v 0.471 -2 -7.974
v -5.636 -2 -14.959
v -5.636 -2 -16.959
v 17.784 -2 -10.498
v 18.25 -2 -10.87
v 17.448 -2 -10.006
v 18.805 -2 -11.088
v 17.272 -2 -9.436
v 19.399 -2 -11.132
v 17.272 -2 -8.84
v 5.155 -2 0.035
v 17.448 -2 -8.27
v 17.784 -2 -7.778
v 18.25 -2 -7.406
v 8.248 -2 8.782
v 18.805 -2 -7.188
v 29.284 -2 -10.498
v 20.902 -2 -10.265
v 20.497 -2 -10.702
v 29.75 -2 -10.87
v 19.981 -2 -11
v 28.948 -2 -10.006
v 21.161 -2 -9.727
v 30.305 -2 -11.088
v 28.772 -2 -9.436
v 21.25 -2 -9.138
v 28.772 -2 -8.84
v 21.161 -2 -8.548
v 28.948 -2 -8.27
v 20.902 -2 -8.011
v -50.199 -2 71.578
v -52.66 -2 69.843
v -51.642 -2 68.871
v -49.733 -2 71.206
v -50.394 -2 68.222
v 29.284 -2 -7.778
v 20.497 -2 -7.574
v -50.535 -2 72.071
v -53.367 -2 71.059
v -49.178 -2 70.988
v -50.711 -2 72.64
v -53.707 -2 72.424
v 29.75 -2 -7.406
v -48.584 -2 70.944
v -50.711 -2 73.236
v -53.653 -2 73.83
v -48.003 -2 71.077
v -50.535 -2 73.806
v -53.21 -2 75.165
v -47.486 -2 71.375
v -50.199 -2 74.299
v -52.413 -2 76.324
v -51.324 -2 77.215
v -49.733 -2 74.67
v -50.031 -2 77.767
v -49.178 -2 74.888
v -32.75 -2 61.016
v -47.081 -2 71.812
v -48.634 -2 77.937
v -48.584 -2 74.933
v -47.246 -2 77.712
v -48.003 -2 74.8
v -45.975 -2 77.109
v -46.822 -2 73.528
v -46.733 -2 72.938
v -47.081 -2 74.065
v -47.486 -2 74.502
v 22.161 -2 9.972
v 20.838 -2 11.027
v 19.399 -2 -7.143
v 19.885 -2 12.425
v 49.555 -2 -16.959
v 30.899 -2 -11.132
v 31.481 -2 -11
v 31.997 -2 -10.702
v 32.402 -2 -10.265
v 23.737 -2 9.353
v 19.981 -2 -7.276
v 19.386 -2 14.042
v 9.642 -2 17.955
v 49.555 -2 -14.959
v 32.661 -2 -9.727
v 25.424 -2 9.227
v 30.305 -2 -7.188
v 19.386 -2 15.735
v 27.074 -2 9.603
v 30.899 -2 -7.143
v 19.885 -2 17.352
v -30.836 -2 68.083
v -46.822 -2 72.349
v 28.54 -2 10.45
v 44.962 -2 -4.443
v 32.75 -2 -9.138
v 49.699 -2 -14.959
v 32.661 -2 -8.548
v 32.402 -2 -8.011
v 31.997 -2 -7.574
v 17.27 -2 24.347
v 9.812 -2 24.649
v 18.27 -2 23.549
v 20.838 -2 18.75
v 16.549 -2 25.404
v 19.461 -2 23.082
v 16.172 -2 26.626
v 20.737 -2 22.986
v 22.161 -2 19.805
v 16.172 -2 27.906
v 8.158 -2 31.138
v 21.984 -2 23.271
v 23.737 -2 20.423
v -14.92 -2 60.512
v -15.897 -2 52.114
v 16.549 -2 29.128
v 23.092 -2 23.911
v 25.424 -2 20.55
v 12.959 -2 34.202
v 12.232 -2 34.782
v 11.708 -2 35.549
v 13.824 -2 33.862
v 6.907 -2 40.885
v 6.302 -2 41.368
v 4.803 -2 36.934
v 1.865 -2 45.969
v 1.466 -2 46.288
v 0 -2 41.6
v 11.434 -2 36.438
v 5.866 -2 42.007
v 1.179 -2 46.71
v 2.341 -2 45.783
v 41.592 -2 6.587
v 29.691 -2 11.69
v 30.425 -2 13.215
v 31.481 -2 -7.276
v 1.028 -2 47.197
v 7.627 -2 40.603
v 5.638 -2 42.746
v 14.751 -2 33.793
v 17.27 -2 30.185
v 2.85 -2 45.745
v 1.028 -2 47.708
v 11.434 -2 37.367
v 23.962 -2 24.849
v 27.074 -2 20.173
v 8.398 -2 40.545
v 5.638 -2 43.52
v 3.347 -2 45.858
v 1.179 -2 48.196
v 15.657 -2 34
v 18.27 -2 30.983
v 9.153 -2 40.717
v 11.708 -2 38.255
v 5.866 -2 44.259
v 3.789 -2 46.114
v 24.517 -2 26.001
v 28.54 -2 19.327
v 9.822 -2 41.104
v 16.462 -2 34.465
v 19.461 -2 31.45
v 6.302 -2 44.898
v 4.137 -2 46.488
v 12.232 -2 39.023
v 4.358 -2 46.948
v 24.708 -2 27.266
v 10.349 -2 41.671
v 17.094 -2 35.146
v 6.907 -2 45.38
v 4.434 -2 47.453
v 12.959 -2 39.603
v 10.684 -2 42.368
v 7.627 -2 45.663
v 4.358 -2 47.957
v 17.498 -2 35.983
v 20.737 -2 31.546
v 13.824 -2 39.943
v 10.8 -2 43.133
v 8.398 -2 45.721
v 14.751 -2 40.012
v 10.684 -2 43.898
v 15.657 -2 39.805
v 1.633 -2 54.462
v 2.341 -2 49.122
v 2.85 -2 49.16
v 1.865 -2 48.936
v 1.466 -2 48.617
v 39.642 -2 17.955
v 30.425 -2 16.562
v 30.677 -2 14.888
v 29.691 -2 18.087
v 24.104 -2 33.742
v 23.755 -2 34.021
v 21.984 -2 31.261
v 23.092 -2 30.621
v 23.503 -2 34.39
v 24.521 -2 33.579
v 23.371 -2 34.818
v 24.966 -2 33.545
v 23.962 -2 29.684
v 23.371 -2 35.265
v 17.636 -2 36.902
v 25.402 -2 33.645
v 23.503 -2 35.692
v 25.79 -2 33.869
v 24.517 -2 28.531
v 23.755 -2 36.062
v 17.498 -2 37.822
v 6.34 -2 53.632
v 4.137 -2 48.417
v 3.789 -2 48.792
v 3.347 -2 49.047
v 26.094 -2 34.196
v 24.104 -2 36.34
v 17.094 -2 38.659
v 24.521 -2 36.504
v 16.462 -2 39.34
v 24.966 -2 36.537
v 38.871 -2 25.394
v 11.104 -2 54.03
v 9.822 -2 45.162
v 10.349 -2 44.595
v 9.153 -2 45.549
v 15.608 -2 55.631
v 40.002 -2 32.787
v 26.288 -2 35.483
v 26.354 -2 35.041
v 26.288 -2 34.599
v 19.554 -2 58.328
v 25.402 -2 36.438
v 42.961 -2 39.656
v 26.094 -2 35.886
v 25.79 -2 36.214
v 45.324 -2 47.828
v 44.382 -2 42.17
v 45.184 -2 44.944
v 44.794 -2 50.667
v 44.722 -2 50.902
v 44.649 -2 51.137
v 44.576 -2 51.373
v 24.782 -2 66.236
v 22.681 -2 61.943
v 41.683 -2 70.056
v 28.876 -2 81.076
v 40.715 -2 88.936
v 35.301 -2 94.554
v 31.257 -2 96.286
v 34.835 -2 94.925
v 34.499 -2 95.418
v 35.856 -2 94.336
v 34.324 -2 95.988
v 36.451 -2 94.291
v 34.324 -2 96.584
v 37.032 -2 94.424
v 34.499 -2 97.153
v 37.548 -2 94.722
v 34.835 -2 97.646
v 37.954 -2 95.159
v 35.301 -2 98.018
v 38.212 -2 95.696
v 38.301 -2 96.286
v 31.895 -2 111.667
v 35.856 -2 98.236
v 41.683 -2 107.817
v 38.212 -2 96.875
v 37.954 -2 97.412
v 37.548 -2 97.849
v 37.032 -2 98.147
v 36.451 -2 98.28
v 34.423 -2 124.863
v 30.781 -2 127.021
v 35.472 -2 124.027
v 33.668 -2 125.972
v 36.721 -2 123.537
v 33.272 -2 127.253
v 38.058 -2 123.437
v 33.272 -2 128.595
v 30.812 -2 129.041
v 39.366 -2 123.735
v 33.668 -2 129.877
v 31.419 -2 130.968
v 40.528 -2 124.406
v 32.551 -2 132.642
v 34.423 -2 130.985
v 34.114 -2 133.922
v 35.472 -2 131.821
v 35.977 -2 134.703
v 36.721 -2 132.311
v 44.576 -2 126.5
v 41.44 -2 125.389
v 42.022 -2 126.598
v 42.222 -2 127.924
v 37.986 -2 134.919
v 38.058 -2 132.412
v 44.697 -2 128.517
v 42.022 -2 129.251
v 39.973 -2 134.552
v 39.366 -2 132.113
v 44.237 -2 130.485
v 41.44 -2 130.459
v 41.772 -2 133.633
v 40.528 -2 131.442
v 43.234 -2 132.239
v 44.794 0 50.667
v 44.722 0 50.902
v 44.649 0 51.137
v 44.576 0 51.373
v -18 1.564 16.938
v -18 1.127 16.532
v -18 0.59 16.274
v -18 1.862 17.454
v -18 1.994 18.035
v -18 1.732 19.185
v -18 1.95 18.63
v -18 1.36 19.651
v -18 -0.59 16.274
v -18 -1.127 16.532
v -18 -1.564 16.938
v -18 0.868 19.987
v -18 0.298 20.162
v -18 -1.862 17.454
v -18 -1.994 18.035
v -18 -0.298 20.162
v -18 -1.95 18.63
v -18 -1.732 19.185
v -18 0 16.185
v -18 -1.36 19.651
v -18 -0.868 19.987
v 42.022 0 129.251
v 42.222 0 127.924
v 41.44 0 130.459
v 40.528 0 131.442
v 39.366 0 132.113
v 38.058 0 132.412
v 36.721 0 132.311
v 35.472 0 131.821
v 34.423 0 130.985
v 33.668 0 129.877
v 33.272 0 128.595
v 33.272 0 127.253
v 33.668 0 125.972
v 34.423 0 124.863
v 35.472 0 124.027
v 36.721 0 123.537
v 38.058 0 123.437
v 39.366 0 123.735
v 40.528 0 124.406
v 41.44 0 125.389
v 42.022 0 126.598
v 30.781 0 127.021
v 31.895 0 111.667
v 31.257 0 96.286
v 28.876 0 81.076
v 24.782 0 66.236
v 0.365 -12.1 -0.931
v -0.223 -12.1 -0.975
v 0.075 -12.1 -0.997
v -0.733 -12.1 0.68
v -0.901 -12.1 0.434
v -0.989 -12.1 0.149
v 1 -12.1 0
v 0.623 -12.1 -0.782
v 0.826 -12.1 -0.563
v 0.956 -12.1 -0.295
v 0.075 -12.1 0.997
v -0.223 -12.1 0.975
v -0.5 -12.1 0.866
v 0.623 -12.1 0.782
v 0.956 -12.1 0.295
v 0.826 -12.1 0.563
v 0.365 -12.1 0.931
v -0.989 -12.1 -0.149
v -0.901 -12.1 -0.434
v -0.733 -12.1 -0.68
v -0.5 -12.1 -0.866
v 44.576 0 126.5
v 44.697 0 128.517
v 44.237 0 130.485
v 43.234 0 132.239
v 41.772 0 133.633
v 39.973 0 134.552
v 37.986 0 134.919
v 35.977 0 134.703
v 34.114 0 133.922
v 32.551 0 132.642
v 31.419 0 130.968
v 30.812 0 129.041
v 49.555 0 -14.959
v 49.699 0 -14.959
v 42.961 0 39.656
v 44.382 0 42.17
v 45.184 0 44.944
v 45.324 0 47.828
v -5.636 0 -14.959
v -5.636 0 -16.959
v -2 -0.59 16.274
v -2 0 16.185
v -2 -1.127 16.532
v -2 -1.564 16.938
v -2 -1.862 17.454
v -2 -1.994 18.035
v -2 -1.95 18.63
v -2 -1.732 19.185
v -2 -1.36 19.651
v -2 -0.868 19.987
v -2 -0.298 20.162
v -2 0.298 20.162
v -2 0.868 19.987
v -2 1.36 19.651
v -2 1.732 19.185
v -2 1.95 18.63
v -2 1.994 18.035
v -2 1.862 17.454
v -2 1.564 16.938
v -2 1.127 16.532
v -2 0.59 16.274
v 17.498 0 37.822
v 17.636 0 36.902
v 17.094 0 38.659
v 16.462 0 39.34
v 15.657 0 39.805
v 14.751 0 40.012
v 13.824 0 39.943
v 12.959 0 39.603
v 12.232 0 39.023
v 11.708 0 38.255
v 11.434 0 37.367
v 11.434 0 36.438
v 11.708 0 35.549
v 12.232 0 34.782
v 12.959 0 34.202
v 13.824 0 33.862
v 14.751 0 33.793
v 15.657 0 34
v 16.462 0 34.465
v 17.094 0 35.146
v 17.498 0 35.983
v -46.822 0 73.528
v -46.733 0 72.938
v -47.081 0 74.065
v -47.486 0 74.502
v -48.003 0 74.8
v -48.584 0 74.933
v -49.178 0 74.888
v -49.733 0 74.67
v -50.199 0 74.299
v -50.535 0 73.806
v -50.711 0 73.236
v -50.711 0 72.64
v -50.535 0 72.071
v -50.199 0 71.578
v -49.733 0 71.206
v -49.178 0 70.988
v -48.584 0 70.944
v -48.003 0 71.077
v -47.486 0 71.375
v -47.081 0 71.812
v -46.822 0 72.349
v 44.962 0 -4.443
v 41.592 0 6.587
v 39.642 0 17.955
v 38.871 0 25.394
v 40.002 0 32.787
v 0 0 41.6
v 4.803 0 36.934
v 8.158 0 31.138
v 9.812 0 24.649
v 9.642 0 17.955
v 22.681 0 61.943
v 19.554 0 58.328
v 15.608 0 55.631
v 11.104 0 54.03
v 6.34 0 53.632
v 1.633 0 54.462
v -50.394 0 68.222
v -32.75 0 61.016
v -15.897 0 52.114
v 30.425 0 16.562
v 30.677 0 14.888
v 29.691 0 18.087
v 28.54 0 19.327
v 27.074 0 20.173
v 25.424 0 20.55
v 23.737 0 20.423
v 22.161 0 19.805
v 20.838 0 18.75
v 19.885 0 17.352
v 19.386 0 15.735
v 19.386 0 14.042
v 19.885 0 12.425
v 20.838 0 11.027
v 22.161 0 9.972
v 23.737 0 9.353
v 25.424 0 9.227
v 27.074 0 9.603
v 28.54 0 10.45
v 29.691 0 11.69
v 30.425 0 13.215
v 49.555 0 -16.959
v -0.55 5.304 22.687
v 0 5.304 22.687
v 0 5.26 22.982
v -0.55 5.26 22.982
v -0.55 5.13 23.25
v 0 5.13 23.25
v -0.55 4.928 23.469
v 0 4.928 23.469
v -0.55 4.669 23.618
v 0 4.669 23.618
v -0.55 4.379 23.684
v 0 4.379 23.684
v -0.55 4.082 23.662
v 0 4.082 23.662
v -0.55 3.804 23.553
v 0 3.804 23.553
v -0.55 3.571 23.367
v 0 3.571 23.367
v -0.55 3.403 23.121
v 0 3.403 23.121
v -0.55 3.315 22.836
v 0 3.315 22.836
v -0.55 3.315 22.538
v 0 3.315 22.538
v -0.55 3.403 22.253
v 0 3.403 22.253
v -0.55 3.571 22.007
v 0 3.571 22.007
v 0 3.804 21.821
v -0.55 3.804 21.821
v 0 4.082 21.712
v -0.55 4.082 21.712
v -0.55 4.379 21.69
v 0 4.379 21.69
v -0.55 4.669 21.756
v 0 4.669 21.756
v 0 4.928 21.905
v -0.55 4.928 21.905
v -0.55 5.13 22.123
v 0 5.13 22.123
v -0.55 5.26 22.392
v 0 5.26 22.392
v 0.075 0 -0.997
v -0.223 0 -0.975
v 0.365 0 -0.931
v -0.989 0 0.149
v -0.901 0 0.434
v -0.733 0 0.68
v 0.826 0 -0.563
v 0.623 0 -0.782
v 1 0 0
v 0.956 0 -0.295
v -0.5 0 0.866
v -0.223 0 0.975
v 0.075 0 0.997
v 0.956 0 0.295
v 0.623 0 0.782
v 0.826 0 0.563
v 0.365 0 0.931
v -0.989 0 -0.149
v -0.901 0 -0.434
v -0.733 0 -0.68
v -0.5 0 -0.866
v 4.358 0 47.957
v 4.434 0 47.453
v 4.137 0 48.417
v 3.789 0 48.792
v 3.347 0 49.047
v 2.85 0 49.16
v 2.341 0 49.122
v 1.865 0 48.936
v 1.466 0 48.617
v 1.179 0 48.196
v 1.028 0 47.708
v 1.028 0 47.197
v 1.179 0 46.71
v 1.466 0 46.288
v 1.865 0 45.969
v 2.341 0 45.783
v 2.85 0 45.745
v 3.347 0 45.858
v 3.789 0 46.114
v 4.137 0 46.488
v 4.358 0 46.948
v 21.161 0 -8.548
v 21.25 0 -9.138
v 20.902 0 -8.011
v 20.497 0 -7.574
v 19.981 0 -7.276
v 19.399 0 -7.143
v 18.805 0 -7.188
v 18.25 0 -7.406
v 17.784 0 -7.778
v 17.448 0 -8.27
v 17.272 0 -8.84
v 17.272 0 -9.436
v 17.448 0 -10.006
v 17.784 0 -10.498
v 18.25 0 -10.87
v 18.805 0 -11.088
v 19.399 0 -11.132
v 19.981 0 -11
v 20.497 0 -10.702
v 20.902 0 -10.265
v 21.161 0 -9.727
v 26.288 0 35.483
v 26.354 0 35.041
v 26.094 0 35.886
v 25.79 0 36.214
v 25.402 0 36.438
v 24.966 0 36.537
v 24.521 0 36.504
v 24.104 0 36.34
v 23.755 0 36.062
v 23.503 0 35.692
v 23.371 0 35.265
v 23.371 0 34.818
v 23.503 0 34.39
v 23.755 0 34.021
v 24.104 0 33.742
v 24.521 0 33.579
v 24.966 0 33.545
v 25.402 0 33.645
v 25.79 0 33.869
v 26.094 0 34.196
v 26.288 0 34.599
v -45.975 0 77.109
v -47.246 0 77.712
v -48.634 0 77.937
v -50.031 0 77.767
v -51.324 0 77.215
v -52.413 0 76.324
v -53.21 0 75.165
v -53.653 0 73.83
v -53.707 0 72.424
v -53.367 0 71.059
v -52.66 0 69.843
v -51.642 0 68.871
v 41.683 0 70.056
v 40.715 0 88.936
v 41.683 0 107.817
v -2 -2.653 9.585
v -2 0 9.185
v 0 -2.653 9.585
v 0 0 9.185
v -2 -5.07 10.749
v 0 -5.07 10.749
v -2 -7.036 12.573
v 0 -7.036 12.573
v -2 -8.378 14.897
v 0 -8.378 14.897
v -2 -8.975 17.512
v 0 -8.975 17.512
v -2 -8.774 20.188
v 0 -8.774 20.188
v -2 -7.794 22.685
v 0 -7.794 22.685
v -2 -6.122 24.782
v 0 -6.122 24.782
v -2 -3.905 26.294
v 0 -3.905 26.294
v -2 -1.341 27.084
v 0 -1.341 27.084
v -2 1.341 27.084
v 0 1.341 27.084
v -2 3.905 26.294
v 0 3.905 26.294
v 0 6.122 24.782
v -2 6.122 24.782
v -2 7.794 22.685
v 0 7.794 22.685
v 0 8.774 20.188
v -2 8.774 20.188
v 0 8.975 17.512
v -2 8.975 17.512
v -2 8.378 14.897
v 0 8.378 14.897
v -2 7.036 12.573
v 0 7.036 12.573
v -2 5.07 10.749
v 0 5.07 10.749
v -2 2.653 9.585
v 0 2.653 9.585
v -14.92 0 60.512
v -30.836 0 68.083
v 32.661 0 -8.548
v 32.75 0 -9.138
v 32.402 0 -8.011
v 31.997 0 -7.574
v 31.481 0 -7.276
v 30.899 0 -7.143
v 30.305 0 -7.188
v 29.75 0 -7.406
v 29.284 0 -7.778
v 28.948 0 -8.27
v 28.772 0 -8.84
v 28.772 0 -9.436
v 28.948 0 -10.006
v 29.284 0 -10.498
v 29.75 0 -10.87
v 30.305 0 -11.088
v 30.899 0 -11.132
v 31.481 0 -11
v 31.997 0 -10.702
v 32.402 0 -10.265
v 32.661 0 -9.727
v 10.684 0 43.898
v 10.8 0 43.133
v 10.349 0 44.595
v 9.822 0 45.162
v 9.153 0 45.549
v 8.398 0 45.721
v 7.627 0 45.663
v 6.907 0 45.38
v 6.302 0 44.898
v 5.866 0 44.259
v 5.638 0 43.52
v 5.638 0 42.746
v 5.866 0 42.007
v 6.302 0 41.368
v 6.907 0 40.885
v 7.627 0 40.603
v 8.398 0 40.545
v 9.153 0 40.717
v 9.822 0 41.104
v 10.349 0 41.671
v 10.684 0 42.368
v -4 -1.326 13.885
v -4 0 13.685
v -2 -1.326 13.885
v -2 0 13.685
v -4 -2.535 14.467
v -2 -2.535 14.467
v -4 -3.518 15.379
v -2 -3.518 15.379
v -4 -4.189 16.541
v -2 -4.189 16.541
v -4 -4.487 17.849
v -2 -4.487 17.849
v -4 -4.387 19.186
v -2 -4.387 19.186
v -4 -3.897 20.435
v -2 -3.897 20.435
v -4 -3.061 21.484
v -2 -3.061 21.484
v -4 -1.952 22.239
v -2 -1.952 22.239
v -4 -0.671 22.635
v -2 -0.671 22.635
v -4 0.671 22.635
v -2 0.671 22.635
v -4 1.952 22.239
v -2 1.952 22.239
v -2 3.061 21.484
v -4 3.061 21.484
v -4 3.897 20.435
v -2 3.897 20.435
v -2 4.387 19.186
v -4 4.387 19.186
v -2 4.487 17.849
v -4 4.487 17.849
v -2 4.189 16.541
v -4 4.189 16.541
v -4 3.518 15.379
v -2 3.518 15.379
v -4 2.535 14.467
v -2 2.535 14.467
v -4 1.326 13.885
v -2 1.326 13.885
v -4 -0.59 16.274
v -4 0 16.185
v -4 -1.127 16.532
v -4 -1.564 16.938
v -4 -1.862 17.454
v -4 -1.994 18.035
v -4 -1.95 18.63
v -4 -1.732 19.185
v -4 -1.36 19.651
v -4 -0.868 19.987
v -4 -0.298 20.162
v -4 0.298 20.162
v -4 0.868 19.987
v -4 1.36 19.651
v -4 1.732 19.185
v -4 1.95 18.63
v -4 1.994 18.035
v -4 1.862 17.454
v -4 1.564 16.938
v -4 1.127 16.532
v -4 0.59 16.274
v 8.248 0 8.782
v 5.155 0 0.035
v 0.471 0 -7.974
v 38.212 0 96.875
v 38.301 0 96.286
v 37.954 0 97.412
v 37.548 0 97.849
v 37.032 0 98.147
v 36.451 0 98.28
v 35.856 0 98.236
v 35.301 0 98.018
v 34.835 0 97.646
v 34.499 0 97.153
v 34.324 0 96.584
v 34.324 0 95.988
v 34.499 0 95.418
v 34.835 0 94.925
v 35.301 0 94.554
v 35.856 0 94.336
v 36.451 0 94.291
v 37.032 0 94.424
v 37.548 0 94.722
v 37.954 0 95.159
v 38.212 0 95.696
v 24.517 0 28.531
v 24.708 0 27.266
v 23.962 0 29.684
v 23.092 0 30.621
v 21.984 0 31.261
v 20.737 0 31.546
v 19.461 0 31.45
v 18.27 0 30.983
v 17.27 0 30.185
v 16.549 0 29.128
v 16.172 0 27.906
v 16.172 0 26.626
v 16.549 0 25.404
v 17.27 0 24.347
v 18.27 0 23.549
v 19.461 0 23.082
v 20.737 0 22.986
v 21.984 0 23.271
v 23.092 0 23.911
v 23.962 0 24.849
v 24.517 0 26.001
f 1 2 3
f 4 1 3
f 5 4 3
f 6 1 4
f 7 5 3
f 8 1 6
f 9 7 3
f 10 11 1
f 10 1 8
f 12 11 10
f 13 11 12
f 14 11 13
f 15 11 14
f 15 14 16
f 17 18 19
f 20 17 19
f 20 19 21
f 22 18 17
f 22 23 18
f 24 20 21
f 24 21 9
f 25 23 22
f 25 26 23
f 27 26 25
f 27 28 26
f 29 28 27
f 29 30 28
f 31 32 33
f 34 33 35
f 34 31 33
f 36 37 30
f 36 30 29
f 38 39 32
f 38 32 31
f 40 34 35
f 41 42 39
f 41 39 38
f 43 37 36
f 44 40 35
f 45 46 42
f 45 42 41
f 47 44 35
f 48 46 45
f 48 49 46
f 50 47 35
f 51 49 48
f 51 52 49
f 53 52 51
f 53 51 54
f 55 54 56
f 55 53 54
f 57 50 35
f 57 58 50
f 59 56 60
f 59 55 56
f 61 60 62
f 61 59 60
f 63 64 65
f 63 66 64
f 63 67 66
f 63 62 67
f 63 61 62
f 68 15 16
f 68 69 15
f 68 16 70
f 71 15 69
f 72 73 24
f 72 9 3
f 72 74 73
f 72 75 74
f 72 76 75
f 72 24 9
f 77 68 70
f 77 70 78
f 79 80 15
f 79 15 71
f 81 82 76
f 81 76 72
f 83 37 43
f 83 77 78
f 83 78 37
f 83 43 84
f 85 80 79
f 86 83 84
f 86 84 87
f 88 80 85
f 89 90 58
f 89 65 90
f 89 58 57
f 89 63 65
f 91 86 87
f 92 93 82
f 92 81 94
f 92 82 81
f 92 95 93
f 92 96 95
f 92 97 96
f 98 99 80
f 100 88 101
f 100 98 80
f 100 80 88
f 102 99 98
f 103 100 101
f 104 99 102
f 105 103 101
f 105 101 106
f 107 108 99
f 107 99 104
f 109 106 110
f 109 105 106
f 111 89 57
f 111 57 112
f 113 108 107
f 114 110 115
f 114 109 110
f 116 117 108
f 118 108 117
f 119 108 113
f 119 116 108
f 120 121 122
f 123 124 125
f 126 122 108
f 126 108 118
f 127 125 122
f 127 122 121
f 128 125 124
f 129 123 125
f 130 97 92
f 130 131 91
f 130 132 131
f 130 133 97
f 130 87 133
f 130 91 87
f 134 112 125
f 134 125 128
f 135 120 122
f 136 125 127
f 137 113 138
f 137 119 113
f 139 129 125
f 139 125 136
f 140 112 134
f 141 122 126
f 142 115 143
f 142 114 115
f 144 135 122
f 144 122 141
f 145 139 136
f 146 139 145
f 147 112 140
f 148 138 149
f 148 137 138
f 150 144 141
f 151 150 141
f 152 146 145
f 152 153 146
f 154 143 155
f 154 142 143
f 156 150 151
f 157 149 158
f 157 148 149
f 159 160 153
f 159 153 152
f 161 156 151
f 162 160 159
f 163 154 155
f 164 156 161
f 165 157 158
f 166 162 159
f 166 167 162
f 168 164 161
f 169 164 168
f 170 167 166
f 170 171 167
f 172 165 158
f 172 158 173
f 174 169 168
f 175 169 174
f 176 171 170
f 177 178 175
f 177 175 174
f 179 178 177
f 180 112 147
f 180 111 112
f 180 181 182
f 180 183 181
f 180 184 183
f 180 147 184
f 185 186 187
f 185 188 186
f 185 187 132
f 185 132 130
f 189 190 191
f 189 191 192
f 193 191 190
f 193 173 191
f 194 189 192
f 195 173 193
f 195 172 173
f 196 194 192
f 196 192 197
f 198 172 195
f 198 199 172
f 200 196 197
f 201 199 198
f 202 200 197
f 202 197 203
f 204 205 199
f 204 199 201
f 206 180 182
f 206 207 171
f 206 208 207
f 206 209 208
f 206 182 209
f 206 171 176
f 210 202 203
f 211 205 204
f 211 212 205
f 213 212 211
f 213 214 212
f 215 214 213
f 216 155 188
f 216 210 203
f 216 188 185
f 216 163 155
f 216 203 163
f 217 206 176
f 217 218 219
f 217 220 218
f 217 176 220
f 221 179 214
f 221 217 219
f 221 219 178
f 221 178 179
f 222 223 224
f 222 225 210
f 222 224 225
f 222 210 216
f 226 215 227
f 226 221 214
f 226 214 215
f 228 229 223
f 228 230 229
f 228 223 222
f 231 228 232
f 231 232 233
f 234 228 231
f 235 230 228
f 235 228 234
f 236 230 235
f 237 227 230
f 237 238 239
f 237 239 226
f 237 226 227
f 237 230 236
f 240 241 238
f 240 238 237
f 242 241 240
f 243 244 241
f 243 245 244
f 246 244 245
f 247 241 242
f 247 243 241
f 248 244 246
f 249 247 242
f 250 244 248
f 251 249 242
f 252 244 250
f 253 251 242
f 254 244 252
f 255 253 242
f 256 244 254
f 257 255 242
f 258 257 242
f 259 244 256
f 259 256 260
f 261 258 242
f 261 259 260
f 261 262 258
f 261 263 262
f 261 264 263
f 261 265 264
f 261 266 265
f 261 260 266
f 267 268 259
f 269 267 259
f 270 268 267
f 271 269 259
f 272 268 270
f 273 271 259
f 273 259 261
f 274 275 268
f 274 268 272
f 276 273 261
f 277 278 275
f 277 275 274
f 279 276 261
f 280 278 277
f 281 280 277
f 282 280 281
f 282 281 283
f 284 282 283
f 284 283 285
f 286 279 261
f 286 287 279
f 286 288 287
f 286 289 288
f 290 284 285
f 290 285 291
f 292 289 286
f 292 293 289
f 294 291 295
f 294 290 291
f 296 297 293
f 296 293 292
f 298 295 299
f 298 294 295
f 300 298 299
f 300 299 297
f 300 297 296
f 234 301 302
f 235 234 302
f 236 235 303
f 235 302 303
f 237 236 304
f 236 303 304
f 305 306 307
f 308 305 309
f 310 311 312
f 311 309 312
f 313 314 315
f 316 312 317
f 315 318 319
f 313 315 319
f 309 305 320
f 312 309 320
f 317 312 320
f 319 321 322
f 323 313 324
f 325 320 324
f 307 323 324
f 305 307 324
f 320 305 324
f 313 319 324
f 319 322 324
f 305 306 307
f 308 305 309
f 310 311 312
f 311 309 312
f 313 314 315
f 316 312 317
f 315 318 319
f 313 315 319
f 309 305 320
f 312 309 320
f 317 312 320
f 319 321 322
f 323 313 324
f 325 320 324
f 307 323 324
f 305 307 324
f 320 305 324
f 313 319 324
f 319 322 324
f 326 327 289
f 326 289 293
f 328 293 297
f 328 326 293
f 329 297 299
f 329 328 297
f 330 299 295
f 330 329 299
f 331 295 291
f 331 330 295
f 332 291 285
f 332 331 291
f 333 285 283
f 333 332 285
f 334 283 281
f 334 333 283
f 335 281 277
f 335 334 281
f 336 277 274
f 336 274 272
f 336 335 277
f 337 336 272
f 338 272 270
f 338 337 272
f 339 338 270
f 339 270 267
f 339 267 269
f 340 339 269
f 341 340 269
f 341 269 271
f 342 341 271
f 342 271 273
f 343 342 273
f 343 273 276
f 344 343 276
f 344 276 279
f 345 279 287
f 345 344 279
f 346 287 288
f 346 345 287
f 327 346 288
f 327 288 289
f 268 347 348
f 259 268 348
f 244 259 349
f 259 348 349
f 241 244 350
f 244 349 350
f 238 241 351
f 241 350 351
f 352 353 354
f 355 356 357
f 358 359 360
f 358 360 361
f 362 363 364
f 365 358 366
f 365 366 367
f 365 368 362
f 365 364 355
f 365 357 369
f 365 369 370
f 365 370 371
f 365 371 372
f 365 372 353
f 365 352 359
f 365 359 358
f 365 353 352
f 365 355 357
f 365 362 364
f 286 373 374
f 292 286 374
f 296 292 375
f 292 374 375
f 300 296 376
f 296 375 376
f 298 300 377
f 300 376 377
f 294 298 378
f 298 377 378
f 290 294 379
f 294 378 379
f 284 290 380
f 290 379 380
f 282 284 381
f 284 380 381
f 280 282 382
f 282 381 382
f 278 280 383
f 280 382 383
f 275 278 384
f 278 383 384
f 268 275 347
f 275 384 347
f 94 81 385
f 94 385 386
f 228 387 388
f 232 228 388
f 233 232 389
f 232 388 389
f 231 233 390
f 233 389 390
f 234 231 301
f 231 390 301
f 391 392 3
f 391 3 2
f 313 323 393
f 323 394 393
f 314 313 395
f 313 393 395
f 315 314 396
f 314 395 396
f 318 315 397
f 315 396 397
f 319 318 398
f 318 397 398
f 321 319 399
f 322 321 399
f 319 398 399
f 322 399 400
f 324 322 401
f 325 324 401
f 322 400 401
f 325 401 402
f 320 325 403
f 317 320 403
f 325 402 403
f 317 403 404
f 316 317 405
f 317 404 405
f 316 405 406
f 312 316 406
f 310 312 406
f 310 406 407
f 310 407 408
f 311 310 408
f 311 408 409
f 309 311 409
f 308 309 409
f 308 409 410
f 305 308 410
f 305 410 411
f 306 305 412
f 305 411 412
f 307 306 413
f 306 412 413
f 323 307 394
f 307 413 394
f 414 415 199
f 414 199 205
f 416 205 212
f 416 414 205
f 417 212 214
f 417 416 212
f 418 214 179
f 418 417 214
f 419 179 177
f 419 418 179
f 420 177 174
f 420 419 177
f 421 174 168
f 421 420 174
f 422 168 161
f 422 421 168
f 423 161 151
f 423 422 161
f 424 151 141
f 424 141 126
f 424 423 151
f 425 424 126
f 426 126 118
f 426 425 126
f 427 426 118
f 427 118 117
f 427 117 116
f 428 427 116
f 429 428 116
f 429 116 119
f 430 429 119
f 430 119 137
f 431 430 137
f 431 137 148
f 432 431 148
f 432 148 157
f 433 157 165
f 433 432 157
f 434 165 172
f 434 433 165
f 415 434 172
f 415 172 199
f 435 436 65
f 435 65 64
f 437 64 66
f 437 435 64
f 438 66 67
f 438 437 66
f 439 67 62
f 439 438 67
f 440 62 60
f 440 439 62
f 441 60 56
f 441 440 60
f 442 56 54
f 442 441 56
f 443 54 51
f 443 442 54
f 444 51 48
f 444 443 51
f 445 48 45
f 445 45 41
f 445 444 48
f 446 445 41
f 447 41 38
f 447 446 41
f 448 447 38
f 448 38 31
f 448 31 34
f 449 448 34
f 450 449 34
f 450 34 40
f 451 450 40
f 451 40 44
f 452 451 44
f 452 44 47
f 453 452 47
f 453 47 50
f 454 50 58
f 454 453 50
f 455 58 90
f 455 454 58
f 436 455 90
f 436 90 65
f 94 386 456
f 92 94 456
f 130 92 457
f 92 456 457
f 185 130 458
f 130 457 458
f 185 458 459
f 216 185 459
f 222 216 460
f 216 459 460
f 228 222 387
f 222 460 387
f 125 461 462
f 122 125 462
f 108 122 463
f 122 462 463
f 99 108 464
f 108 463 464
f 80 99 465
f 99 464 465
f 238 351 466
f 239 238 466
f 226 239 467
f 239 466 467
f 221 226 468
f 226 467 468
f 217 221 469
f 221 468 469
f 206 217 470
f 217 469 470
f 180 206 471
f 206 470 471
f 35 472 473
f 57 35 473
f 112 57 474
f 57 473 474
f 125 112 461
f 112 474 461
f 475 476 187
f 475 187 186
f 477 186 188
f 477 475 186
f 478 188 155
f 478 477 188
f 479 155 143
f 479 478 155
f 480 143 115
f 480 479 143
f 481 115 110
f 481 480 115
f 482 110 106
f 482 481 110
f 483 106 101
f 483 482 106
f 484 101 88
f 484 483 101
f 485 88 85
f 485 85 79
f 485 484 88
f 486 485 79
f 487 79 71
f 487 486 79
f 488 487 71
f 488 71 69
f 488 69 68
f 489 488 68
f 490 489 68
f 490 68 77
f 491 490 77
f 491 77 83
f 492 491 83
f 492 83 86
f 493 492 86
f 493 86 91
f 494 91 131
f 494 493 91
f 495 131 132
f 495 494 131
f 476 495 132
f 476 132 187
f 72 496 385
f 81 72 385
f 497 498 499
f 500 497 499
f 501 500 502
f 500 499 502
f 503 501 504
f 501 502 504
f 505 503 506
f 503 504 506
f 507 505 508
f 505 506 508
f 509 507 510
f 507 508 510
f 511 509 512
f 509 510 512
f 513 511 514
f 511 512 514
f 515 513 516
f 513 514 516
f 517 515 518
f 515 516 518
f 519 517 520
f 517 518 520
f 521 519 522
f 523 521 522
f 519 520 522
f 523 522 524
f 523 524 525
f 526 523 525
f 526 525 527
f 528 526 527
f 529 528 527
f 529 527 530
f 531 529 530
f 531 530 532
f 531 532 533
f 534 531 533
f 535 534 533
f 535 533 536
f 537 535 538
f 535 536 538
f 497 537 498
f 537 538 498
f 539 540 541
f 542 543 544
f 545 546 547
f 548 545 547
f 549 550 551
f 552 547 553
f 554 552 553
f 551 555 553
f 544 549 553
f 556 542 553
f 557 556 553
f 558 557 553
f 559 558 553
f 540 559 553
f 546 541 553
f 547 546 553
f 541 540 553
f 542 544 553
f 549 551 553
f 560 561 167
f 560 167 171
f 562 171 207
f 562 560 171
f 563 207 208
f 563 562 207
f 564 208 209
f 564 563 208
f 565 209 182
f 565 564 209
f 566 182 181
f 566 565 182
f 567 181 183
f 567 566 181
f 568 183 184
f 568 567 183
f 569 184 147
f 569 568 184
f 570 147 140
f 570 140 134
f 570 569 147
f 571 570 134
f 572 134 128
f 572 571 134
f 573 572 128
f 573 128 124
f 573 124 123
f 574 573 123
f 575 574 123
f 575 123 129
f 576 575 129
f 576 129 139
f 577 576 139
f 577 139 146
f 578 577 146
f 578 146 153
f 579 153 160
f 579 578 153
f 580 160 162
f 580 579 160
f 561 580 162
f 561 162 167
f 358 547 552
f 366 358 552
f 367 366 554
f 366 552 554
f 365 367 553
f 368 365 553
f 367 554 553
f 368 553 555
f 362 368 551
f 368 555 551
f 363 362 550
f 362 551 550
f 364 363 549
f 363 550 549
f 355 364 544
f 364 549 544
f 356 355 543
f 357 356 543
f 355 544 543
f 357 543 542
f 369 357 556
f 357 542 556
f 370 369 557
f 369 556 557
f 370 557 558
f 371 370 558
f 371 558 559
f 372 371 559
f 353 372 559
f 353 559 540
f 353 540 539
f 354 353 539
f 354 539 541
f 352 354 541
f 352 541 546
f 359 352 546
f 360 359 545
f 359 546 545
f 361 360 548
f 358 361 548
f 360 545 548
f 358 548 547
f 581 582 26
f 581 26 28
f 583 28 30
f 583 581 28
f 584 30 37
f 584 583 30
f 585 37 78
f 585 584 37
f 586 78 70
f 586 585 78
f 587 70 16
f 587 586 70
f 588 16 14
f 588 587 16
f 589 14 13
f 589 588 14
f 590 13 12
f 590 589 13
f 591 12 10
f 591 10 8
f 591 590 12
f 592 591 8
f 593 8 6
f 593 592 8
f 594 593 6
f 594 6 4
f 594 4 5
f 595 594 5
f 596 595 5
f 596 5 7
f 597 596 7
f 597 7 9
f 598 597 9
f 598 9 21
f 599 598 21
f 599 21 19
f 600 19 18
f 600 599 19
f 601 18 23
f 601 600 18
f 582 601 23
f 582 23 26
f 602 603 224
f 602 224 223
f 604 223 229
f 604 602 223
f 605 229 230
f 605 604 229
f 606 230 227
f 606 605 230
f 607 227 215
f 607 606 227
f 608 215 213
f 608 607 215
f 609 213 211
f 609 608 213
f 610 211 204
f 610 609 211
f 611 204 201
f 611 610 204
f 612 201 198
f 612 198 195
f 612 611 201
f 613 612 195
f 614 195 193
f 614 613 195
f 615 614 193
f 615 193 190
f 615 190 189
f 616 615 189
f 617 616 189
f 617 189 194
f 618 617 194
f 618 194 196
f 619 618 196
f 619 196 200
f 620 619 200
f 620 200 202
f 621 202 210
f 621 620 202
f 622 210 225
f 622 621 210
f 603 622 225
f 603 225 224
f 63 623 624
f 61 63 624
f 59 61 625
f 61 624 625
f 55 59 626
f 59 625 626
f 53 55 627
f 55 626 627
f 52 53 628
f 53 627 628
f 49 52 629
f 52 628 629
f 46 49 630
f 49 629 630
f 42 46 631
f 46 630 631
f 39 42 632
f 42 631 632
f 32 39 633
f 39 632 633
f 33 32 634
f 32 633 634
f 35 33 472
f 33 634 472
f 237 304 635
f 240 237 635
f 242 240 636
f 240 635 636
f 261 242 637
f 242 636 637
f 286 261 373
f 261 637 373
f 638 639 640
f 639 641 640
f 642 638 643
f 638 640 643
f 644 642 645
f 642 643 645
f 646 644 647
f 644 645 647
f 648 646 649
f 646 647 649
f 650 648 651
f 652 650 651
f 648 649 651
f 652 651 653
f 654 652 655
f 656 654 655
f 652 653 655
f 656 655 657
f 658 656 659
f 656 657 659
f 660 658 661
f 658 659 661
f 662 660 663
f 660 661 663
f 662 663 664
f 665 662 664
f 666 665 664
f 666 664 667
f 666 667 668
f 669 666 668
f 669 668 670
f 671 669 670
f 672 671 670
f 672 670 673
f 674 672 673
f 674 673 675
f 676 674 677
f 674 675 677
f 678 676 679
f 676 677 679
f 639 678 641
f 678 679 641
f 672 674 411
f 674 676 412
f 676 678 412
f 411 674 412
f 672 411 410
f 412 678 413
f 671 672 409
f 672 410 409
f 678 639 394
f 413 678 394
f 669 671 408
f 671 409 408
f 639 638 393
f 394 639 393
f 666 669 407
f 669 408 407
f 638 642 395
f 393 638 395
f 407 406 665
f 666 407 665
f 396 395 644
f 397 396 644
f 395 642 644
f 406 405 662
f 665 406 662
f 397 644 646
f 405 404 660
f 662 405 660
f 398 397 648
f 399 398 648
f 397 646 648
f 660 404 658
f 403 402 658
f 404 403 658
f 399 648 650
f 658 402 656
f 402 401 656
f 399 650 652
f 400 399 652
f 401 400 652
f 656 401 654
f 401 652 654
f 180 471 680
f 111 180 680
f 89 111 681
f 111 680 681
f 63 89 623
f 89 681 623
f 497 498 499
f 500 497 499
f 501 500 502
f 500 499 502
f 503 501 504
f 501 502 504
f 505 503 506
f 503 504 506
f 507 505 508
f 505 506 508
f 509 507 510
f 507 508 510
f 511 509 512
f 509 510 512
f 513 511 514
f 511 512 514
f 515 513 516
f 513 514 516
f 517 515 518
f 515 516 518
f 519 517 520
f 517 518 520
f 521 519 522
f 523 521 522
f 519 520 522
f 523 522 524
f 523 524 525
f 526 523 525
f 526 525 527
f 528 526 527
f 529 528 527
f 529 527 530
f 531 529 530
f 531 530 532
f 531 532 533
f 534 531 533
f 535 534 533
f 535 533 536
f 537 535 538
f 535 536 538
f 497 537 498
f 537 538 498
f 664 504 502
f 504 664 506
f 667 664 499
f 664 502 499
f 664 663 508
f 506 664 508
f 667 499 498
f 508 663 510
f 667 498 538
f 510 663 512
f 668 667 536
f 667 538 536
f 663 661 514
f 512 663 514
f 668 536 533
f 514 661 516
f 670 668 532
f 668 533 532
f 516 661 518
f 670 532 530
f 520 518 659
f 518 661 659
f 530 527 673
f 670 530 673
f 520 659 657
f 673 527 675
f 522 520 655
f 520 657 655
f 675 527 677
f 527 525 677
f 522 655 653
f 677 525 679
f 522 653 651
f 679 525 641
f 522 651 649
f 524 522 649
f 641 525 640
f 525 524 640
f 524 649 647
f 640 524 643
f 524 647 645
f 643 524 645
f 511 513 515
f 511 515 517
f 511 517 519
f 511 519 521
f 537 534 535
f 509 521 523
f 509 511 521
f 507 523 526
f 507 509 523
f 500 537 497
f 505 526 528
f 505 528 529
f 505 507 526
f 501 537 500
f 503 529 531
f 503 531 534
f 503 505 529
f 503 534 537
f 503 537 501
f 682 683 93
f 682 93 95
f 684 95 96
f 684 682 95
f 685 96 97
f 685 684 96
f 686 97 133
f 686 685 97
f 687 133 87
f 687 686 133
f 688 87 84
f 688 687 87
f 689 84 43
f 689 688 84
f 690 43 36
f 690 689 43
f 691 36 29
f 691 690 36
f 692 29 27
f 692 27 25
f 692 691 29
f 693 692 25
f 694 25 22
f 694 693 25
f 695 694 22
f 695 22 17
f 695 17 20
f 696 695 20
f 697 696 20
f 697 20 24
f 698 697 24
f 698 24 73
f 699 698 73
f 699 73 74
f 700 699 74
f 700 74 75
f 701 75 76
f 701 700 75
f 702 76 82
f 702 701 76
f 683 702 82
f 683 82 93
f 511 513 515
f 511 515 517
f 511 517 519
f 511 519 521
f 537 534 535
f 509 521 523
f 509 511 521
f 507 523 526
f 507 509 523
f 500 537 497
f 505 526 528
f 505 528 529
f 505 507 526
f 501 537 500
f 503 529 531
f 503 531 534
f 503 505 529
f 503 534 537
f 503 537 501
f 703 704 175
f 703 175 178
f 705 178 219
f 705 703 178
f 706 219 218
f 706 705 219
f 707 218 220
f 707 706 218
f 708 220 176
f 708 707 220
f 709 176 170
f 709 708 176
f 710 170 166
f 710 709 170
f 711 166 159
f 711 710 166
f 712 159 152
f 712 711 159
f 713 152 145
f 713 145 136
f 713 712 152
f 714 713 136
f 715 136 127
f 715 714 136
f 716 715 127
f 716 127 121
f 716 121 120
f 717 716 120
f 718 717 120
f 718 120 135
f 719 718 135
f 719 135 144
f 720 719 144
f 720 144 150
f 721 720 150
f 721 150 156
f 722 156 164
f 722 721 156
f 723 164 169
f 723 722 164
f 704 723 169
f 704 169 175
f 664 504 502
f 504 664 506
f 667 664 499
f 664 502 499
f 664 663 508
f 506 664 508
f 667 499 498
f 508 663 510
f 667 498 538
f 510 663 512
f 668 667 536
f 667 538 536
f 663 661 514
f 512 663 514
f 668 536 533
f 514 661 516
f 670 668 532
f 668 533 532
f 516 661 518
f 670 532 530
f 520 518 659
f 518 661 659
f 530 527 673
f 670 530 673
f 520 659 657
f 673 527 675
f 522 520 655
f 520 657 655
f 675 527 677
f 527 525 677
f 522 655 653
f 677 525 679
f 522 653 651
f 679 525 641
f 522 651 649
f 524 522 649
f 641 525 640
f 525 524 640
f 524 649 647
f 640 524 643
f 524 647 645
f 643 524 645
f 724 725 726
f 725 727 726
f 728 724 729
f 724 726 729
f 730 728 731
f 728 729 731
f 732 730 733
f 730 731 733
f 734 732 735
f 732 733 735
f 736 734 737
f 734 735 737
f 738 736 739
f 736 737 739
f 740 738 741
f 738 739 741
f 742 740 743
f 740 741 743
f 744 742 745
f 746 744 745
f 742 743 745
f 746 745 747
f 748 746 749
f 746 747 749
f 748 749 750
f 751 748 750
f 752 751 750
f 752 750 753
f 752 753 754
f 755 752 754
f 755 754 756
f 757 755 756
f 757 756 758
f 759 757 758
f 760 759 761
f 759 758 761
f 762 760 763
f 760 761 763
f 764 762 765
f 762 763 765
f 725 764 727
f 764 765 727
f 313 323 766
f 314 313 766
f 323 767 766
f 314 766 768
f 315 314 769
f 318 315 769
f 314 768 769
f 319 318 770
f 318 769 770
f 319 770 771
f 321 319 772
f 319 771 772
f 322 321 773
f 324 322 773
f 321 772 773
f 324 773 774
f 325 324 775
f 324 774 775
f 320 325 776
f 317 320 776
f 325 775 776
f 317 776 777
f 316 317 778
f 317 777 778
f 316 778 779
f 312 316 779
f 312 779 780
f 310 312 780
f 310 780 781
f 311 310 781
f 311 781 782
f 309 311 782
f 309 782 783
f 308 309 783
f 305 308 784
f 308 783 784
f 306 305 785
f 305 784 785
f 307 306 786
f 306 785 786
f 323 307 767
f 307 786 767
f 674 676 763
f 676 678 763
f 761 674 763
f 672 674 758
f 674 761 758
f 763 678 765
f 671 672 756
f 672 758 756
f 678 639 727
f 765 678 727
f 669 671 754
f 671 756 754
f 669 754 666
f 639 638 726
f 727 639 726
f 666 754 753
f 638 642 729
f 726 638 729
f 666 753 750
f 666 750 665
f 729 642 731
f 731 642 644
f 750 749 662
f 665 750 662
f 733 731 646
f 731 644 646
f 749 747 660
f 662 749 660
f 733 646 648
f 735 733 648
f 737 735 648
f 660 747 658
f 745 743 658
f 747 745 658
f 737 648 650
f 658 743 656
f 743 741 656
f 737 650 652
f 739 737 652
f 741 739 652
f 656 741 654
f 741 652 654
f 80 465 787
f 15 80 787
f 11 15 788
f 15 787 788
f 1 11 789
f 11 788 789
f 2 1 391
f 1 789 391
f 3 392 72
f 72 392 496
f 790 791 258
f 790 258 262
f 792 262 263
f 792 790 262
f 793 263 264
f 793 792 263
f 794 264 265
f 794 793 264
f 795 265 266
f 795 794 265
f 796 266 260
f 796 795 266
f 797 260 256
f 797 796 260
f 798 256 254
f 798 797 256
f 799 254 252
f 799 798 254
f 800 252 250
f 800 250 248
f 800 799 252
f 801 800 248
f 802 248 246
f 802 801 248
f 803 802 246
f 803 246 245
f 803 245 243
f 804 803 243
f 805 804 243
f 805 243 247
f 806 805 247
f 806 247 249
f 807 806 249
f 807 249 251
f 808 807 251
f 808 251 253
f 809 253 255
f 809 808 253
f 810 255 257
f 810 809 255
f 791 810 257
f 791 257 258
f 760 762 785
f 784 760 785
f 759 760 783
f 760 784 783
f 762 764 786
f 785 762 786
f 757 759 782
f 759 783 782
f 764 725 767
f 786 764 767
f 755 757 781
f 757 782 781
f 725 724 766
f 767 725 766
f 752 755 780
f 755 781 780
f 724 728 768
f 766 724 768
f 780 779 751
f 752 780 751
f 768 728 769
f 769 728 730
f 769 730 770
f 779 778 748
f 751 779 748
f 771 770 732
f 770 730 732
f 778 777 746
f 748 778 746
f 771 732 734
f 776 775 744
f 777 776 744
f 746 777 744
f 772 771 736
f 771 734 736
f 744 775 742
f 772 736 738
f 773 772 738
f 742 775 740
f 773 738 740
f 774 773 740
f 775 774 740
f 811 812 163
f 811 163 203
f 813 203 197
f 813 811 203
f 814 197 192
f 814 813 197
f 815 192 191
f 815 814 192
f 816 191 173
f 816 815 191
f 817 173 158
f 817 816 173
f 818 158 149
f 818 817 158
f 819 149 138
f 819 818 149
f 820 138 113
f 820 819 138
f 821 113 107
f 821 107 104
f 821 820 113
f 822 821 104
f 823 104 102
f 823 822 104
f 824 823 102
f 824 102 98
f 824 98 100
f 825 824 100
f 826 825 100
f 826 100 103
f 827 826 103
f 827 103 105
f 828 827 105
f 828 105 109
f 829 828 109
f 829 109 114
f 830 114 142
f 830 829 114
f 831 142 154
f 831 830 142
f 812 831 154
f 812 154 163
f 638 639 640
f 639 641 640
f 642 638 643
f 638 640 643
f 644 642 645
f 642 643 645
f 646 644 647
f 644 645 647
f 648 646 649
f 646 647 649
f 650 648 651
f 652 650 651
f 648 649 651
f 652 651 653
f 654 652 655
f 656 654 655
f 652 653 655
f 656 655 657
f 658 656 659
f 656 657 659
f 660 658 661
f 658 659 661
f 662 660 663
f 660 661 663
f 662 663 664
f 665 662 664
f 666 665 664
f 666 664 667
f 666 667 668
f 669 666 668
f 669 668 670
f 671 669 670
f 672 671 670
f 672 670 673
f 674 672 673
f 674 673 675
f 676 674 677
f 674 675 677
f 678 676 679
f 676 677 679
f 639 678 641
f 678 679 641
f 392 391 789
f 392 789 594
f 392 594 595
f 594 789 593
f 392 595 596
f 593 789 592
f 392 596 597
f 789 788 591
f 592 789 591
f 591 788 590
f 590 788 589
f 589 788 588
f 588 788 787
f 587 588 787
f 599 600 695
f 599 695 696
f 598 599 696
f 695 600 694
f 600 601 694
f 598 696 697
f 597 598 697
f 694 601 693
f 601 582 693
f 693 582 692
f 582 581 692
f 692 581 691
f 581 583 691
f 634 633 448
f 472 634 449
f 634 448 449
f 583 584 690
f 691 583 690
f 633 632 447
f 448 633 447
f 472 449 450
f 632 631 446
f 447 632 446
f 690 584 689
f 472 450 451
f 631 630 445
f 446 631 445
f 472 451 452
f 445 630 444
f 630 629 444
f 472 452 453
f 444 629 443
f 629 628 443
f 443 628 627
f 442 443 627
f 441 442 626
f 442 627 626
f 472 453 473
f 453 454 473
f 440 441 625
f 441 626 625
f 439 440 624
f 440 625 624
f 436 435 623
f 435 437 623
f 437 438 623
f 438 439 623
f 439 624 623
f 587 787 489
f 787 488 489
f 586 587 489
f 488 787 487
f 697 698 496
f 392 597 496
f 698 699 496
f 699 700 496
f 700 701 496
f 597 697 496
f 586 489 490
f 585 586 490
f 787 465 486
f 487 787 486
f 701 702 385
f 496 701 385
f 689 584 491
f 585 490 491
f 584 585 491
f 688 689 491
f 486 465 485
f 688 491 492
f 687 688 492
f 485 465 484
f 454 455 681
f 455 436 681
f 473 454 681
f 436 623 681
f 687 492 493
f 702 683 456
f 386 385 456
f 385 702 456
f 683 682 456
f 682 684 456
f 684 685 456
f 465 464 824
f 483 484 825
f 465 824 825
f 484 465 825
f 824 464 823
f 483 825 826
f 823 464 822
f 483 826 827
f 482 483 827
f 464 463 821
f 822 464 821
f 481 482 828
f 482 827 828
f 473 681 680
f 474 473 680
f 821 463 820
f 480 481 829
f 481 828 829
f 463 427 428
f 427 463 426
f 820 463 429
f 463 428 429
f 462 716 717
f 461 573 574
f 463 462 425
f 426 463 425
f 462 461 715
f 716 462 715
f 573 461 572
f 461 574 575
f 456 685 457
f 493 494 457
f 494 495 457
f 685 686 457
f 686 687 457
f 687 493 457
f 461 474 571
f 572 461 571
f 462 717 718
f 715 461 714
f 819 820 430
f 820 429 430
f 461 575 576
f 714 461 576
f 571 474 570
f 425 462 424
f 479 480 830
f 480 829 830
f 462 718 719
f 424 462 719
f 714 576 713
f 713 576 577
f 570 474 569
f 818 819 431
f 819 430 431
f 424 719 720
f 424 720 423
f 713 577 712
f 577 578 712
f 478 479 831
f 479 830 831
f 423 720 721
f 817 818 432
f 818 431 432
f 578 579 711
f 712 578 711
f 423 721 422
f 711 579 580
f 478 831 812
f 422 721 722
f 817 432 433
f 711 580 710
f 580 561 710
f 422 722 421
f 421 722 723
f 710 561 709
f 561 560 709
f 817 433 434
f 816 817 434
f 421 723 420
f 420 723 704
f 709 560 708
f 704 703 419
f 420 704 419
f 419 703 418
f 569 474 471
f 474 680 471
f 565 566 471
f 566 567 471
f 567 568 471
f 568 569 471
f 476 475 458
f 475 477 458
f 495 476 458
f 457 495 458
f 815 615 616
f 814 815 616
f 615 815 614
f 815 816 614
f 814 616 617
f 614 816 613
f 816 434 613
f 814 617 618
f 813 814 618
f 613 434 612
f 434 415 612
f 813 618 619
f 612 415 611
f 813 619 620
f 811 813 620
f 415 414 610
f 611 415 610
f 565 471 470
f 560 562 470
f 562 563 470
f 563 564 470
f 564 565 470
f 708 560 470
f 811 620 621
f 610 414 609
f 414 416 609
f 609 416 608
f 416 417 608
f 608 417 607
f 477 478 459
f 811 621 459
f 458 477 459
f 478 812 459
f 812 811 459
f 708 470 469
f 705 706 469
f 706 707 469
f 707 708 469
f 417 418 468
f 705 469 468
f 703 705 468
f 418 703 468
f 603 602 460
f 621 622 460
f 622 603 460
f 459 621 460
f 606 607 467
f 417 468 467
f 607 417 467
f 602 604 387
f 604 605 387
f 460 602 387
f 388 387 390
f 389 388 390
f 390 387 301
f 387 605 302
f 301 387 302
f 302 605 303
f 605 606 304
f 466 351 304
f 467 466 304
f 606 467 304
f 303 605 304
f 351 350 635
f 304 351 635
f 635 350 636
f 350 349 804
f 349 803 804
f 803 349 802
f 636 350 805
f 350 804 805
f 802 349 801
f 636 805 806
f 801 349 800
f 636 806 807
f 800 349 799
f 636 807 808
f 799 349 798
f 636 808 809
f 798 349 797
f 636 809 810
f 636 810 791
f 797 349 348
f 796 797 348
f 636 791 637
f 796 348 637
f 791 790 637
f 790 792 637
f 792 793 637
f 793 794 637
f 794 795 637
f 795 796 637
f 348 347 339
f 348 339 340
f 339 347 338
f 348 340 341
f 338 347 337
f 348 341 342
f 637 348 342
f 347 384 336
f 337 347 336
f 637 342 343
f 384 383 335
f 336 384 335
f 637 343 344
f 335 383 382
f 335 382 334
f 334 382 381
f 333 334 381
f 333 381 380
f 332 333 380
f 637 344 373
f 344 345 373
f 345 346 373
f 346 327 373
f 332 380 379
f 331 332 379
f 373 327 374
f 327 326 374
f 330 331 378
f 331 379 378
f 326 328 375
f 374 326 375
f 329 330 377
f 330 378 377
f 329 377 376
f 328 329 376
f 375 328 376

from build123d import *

# Parameters (mm, degrees)
F0_R      = 2
F0_R_2    = 5.677376
F0_R_3    = 4.29169
F0_R_4    = 3.118239
F0_R_5    = 1.71257
F0_R_6    = 2.595247
F0_R_7    = 1.5
F0_R_8    = 4.5
F0_W      = 55.190553
F0_H      = 2
F1_DEPTH  = 2
F4_R      = 1
F5_DEPTH  = 0.55
F8_DEPTH  = 0.55
F9_R      = 1
F10_DEPTH = 12.1


with BuildPart() as f1:
    # F0 (on Front) → F1 (new body)
    with BuildSketch(Plane.XZ):
        with BuildLine():
            ThreePointArc((0, 41.600476), (8.157917, 31.138253), (9.641756, 17.954629))
            ThreePointArc((9.641756, 17.954629), (5.154563, 0.035024), (-5.635959, -14.958701))
            Line((-5.635959, -14.958701), (49.554594, -14.958701))
            Line((49.554594, -14.958701), (49.69853, -14.958701))
            ThreePointArc((49.69853, -14.958701), (43.102022, 1.01882), (39.641756, 17.954629))
            ThreePointArc((39.641756, 17.954629), (39.20069, 29.126338), (42.960597, 39.655569))
            ThreePointArc((42.960597, 39.655569), (45.183806, 44.943707), (44.794475, 50.666949))
            ThreePointArc((44.794475, 50.666949), (44.685096, 51.019717), (44.575866, 51.372531))
            ThreePointArc((44.575866, 51.372531), (40.715332, 88.936437), (44.575866, 126.500342))
            ThreePointArc((44.575866, 126.500342), (37.986212, 134.919137), (30.780691, 127.021029))
            ThreePointArc((30.780691, 127.021029), (31.257206, 96.285679), (24.782057, 66.236365))
            ThreePointArc((24.782057, 66.236365), (15.607536, 55.631), (1.633307, 54.462014))
            ThreePointArc((1.633307, 54.462014), (-22.966894, 64.111596), (-45.974794, 77.108553))
            ThreePointArc((-45.974794, 77.108553), (-53.210231, 75.164761), (-50.394055, 68.222209))
            ThreePointArc((-50.394055, 68.222209), (-24.214088, 56.772014), (0, 41.600476))
        make_face()
        with Locations((19.25, -9.137886)):
            Circle(F0_R, mode=Mode.SUBTRACT)
        with Locations((30.75, -9.137886)):
            Circle(F0_R, mode=Mode.SUBTRACT)
        with Locations((25, 14.888397)):
            Circle(F0_R_2, mode=Mode.SUBTRACT)
        with Locations((20.415939, 27.266106)):
            Circle(F0_R_3, mode=Mode.SUBTRACT)
        with Locations((14.517837, 36.902443)):
            Circle(F0_R_4, mode=Mode.SUBTRACT)
        with Locations((2.721631, 47.452573)):
            Circle(F0_R_5, mode=Mode.SUBTRACT)
        with Locations((8.204374, 43.132834)):
            Circle(F0_R_6, mode=Mode.SUBTRACT)
        with Locations((24.85433, 35.041299)):
            Circle(F0_R_7, mode=Mode.SUBTRACT)
        with Locations((-48.733287, 72.938336)):
            Circle(F0_R, mode=Mode.SUBTRACT)
        with Locations((36.301211, 96.285679)):
            Circle(F0_R, mode=Mode.SUBTRACT)
        with Locations((37.722191, 127.924118)):
            Circle(F0_R_8, mode=Mode.SUBTRACT)
        with Locations((21.959317, -15.958701)):
            Rectangle(F0_W, F0_H)
    extrude(amount=F1_DEPTH)


with BuildPart() as f3:
    # F2 (on Front) → F3 (revolve)
    with BuildSketch(Plane.XZ):
        Polygon((-2, 9.184818), (0, 9.184818), (0, 18.184818), (-18, 18.184818), (-18, 16.184818), (-4, 16.184818), (-4, 13.684818), (-2, 13.684818), align=None)
    revolve(axis=Axis((-18.238114, 0, 18.184818), (-1, 0, 0)))

    # F4 (on face) → F5 (cut)
    with BuildSketch(Plane.YZ):
        with Locations((4.304045, 22.686757)):
            Circle(F4_R)
    extrude(amount=-F5_DEPTH, mode=Mode.SUBTRACT)


with BuildPart() as f7:
    # F6 (on Front) → F7 (revolve)
    with BuildSketch(Plane.XZ):
        Polygon((-18, 18.184818), (-18, 16.184818), (-2, 16.184818), (-2, 13.684818), (-2, 9.184818), (0, 9.184818), (0, 18.184818), align=None)
    revolve(axis=Axis((-10.073503, 0, 18.184818), (-1, 0, 0)))

    # F4 (on face) → F8 (cut)
    with BuildSketch(Plane.YZ):
        with Locations((4.304045, 22.686757)):
            Circle(F4_R)
    extrude(amount=-F8_DEPTH, mode=Mode.SUBTRACT)


with BuildPart() as f10:
    # F9 (on Front) → F10 (new body)
    with BuildSketch(Plane.XZ):
        Circle(F9_R)
    extrude(amount=F10_DEPTH)


solid = Compound([f1.part, f3.part, f7.part, f10.part])
